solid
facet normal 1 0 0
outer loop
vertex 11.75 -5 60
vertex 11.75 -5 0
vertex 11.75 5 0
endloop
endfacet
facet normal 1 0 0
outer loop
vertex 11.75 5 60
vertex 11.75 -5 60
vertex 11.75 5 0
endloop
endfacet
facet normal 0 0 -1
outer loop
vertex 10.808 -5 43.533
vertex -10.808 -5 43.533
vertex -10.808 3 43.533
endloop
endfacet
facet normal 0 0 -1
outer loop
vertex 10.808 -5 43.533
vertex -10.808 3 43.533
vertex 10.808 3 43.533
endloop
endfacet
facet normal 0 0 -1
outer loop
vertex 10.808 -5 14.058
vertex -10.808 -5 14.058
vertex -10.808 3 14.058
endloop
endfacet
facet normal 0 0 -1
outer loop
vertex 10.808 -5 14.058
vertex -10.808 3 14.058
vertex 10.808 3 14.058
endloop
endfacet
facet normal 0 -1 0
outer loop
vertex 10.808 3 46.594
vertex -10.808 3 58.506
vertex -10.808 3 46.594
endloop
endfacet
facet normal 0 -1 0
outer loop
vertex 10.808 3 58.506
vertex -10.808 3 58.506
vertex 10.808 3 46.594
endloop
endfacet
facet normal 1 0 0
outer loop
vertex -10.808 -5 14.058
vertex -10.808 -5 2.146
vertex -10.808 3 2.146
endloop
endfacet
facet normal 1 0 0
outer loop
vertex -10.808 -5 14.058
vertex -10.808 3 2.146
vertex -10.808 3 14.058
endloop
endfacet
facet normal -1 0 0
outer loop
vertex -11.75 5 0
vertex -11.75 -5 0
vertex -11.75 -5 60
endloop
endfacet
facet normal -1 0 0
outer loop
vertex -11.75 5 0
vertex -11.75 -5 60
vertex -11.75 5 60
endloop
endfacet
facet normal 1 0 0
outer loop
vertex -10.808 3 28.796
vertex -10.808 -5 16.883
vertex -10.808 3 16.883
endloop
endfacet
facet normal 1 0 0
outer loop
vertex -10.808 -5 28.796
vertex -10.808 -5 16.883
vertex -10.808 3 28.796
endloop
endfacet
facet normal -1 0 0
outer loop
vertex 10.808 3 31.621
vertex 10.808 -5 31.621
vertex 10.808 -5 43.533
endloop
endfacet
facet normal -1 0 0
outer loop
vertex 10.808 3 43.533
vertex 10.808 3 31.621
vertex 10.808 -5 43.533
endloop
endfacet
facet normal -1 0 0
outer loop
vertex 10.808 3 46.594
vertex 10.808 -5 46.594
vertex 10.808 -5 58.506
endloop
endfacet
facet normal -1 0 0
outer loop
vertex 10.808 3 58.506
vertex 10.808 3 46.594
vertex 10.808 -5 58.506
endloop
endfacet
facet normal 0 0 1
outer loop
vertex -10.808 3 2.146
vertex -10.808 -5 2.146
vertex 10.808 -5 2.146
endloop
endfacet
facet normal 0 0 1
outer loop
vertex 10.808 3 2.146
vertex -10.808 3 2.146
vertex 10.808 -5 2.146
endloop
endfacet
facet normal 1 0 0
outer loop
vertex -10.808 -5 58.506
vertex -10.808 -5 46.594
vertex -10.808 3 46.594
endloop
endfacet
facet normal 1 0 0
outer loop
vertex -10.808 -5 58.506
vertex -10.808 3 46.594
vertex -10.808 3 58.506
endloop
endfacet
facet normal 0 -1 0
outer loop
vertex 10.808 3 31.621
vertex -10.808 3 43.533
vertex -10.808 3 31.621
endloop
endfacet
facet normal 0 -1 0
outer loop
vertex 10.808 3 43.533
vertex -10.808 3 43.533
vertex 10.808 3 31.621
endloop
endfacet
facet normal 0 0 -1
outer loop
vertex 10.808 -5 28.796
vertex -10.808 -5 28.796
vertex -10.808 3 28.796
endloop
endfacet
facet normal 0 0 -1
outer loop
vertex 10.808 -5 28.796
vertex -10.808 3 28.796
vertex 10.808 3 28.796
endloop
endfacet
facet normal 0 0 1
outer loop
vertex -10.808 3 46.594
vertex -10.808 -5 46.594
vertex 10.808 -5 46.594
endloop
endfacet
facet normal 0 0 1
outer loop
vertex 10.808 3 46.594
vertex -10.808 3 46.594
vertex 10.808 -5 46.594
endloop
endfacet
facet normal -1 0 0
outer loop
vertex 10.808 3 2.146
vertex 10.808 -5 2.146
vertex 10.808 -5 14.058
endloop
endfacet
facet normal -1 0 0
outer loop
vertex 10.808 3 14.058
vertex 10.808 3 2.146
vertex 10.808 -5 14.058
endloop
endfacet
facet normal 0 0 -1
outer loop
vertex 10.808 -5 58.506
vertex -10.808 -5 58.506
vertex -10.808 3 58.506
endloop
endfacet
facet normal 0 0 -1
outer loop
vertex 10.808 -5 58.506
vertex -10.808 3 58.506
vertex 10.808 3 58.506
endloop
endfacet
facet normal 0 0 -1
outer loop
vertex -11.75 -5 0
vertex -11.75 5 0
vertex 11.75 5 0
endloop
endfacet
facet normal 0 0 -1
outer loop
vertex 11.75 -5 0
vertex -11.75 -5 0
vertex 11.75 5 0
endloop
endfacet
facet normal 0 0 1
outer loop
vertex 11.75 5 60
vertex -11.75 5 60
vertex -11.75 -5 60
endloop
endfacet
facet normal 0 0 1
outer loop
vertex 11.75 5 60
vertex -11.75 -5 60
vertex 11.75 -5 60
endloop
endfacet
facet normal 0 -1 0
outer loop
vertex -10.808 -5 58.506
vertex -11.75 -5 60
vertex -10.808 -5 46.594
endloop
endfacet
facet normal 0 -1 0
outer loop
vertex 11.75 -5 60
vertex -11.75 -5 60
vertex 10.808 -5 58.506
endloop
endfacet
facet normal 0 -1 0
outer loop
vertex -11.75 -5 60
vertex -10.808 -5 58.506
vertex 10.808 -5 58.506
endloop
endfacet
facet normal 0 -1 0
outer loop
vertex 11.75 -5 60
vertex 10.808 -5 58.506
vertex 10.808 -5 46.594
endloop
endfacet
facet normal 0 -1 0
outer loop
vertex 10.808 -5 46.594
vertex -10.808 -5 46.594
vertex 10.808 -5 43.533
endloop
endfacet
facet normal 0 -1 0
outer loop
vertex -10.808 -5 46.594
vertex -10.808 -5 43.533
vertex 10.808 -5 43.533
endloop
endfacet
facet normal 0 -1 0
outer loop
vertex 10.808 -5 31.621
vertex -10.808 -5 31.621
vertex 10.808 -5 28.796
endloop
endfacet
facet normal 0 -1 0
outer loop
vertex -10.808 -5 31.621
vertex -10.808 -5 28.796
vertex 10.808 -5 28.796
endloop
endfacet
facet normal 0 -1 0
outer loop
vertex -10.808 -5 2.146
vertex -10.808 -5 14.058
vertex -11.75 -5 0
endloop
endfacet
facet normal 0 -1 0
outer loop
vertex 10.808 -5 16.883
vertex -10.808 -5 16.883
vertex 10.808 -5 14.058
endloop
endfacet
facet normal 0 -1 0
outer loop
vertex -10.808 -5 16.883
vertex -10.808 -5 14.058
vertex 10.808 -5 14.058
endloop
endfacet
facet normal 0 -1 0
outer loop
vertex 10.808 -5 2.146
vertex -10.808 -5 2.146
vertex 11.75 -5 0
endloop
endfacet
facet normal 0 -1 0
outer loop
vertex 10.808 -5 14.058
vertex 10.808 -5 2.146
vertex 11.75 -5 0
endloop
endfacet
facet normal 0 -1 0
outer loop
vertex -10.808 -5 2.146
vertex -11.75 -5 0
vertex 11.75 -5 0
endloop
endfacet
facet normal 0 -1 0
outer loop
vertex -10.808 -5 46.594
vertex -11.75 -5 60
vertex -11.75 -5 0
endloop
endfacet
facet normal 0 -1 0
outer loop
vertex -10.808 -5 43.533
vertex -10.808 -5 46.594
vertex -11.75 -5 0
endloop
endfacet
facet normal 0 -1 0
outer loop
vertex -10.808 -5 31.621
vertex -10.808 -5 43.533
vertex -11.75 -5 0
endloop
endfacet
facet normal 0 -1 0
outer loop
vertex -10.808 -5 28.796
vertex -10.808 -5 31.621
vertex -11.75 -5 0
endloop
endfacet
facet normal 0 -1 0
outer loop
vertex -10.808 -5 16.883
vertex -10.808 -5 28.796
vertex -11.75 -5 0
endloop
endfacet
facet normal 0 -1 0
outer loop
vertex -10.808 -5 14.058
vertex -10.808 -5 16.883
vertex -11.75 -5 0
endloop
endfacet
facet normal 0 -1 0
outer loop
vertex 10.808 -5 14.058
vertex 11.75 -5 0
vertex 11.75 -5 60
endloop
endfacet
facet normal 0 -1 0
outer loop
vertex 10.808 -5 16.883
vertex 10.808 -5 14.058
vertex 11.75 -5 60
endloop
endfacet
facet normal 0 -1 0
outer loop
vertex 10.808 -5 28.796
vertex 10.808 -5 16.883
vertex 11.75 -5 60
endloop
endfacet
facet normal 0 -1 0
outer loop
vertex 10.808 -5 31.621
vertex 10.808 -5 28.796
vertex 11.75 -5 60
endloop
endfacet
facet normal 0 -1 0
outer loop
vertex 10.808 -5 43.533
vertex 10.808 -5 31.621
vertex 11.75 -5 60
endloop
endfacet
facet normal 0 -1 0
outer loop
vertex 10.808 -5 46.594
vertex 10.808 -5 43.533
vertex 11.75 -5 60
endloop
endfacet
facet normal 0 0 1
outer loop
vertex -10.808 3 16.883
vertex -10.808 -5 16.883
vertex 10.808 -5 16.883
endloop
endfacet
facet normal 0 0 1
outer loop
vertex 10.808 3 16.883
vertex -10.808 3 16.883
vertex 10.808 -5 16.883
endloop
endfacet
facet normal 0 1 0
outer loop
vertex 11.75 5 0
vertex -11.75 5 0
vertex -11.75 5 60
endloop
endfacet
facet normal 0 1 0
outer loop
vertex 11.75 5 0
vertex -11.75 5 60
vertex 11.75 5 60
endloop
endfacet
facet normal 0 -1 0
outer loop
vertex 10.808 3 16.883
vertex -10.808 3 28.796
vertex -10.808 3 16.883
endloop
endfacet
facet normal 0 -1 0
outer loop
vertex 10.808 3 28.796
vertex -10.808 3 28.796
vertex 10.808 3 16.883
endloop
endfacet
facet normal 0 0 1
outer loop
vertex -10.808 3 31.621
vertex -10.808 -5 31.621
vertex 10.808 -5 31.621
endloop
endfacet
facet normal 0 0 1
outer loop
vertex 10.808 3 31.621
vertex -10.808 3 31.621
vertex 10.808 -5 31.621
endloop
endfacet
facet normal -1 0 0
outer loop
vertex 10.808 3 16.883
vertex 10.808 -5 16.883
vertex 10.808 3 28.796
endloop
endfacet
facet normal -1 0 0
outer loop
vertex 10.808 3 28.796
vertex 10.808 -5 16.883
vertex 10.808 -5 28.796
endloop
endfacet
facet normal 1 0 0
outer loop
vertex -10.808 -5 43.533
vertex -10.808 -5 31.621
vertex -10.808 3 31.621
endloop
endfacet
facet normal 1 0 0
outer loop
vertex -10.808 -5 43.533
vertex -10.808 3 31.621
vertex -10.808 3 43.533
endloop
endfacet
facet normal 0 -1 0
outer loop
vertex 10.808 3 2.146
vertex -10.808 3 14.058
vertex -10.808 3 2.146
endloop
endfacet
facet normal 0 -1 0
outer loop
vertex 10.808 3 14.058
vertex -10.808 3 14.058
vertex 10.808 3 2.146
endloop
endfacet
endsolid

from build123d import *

# Parameters (mm, degrees)
F0_W     = 23.5
F0_H     = 10
F1_DEPTH = 60
F2_W     = 21.615356
F2_H     = 11.912346
F3_DEPTH = 8


with BuildPart() as f1:
    # F0 (on Top) → F1 (new body)
    with BuildSketch(Plane.XY):
        Rectangle(F0_W, F0_H)
    extrude(amount=F1_DEPTH)

    # F2 (on face) → F3 (cut)
    with BuildSketch(Plane.XZ.offset(5)):
        with Locations((0, 52.550074)):
            Rectangle(F2_W, F2_H)
        with Locations((0, 37.576918)):
            Rectangle(F2_W, F2_H)
        with Locations((0, 22.839397)):
            Rectangle(F2_W, F2_H)
        with Locations((0, 8.101878)):
            Rectangle(F2_W, F2_H)
    extrude(amount=-F3_DEPTH, mode=Mode.SUBTRACT)


solid = f1.part
